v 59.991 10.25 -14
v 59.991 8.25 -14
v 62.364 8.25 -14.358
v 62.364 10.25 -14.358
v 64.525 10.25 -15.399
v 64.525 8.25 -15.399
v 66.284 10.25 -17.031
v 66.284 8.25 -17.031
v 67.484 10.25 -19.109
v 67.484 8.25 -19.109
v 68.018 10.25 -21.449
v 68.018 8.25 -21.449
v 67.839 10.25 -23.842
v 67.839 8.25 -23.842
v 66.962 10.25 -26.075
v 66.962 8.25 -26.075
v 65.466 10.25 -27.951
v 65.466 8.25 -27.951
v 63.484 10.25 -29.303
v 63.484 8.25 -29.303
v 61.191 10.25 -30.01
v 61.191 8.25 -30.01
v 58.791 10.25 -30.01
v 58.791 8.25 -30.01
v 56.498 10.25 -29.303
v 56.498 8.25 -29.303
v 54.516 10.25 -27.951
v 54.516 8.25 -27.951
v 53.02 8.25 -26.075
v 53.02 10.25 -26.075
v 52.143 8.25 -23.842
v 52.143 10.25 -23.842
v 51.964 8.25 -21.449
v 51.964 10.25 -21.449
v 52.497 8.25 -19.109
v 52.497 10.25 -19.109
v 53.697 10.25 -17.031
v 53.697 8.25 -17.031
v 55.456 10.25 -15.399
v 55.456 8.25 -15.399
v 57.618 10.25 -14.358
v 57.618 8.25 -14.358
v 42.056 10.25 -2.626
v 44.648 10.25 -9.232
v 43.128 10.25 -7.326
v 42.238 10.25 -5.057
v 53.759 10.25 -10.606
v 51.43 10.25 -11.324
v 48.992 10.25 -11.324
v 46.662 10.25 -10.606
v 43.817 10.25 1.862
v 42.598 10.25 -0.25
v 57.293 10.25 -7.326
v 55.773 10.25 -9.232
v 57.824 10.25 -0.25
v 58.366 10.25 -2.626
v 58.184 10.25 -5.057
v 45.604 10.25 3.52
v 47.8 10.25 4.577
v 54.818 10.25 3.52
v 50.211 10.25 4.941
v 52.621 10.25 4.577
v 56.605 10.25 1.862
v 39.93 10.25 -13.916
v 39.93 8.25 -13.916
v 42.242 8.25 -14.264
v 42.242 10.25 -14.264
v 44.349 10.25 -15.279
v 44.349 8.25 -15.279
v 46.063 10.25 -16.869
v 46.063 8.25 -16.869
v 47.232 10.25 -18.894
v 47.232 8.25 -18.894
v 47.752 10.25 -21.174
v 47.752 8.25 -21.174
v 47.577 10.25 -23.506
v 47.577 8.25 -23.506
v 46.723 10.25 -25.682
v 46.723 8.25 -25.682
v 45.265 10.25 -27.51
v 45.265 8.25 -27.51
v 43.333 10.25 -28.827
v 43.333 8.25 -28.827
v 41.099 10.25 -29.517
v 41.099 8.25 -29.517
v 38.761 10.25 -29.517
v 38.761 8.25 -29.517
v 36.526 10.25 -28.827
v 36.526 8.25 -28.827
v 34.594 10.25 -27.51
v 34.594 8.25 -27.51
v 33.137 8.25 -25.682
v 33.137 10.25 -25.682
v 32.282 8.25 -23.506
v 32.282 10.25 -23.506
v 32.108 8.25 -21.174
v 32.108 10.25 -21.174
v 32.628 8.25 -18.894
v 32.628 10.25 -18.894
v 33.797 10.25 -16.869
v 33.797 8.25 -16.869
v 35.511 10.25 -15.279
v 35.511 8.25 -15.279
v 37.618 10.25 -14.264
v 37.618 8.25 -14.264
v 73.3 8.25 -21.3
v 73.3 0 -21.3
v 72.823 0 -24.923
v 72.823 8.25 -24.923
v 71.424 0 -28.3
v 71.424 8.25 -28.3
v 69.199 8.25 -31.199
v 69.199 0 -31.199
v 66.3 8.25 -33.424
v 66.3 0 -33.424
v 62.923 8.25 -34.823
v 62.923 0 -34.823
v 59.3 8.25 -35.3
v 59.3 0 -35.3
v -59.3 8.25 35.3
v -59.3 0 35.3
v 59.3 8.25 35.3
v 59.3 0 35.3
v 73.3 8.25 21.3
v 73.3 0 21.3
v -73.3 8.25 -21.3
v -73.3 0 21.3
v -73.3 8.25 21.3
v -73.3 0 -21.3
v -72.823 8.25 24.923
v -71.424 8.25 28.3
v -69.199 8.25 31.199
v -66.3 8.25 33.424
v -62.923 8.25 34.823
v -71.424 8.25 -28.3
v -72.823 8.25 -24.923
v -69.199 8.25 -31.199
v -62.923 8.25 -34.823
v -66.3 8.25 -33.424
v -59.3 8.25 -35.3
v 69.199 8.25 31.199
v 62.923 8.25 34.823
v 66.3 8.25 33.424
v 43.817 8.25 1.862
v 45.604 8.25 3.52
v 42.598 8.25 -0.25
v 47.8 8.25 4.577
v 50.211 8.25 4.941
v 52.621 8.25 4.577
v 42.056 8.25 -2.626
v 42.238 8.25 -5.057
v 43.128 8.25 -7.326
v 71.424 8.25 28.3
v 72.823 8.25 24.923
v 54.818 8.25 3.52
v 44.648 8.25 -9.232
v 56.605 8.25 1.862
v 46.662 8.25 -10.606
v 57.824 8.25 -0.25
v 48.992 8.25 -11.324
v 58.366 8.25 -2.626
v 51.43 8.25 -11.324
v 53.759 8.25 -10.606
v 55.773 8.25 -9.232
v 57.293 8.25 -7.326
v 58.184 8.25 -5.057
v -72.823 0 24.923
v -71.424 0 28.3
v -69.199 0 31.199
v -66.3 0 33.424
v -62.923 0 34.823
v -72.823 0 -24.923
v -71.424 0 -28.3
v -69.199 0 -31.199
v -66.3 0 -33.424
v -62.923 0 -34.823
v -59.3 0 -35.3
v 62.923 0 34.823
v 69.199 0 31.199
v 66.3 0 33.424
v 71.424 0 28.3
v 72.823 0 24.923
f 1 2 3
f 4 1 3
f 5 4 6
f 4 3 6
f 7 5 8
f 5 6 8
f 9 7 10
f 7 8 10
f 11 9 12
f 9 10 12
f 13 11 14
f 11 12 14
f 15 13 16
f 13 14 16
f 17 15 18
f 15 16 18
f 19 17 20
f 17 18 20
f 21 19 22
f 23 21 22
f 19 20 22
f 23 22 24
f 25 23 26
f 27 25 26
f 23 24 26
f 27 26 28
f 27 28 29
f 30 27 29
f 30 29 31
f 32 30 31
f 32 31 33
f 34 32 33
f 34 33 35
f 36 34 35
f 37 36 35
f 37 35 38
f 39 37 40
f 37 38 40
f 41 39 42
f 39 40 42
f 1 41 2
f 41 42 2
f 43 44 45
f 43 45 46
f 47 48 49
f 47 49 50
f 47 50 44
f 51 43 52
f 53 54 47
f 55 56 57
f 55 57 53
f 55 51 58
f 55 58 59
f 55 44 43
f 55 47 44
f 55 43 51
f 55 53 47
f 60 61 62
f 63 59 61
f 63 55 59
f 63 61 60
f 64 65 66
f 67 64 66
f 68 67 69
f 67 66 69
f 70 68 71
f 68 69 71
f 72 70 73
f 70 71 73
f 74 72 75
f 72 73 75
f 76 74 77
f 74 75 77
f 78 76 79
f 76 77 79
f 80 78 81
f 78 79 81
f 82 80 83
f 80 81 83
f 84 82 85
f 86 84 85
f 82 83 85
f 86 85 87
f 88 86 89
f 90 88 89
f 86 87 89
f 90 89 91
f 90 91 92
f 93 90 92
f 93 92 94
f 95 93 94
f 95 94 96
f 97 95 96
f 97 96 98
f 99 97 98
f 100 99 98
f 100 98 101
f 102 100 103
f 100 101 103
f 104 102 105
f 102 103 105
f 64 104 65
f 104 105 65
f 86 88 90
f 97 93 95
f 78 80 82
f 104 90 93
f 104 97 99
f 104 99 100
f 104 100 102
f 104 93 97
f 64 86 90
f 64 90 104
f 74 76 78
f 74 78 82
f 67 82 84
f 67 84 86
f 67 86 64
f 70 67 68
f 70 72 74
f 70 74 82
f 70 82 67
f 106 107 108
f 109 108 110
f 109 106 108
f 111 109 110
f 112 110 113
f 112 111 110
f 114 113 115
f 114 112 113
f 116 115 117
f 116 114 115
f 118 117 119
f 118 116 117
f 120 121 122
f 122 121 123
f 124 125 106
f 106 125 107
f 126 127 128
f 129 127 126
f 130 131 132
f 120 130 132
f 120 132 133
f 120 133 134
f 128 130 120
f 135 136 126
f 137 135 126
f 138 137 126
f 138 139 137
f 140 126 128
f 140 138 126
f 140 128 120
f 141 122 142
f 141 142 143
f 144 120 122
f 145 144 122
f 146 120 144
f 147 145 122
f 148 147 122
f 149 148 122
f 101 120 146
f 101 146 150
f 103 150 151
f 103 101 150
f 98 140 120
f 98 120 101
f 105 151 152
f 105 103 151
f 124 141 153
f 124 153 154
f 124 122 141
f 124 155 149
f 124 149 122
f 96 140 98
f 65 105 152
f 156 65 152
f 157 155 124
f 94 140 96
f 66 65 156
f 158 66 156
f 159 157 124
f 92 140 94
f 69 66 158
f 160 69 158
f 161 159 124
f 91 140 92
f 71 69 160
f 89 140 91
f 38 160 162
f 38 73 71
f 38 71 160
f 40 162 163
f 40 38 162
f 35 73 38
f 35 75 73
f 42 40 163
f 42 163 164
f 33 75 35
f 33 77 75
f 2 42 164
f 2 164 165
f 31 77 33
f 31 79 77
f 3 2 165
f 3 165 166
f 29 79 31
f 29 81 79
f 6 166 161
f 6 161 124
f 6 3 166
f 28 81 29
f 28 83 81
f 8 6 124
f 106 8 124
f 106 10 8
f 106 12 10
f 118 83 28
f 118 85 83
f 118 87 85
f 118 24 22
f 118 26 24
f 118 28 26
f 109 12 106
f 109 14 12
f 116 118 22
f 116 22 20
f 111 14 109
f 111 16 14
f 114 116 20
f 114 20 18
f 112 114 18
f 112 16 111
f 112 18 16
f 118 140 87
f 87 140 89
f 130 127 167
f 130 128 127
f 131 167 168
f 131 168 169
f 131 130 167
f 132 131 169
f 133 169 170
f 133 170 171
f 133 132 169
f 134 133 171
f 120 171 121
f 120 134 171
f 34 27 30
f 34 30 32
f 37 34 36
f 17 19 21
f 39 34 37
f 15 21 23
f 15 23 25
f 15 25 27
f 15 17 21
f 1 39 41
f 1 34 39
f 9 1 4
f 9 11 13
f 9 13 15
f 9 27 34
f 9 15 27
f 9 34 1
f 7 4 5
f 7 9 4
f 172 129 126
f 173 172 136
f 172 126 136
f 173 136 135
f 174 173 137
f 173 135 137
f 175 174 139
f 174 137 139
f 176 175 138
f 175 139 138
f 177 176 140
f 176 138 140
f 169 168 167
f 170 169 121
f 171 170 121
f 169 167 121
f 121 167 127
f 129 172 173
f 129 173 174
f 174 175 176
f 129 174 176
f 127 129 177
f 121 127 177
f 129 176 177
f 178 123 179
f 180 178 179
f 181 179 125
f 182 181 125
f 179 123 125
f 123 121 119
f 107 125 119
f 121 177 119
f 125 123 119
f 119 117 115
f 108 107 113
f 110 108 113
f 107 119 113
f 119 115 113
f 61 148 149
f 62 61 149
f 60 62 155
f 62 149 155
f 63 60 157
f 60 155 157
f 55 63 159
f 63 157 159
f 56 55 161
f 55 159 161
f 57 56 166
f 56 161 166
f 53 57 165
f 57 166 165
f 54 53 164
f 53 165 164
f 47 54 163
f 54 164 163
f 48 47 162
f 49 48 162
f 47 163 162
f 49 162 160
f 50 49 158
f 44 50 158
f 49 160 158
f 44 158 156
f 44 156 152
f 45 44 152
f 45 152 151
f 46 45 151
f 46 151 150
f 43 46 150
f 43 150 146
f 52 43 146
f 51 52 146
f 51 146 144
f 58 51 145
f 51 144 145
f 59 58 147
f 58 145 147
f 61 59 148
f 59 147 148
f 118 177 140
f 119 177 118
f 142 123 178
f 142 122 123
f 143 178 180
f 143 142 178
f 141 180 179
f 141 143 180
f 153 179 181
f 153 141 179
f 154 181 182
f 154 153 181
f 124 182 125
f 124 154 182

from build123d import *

# Parameters (mm, degrees)
SKETCH1_W           = 146.6
SKETCH1_H           = 70.6
BOSS_EXTRUDE1_DEPTH = 8.25
FILLET1_R           = 14
SKETCH2_R           = 7.8441354
SKETCH2_R_2         = 8.049819652
SKETCH2_R_3         = 8.178113635
BOSS_EXTRUDE2_DEPTH = 2


with BuildPart() as part:
    # Sketch1 → Boss-Extrude1 (new body)
    with BuildSketch(Plane(origin=(0, 0, 0), x_dir=(1, 0, 0), z_dir=(0, 1, 0))):
        Rectangle(SKETCH1_W, SKETCH1_H)
    extrude(amount=BOSS_EXTRUDE1_DEPTH)

    # Fillet1
    fillet1_edges = [part.edges().sort_by_distance(p)[0] for p in [
        (-73.3, 4.125, -35.3),
        (73.3, 4.125, -35.3),
        (73.3, 4.125, 35.3),
        (-73.3, 4.125, 35.3),
    ]]
    fillet(fillet1_edges, radius=FILLET1_R)

    # Sketch2 → Boss-Extrude2 (add)
    with BuildSketch(Plane(origin=(0, 8.25, 0), x_dir=(1, 0, 0), z_dir=(0, 1, 0))):
        with Locations(Location((39.929810702, 21.760044193, 0), (0, 0, 270))):
            Circle(SKETCH2_R)
        with Locations(Location((59.990850443, 22.050286799, 0), (0, 0, 270))):
            Circle(SKETCH2_R_2)
        with Locations(Location((50.210763803, 3.237335299, 0), (0, 0, 270))):
            Circle(SKETCH2_R_3)
    extrude(amount=BOSS_EXTRUDE2_DEPTH)


solid = part.part
